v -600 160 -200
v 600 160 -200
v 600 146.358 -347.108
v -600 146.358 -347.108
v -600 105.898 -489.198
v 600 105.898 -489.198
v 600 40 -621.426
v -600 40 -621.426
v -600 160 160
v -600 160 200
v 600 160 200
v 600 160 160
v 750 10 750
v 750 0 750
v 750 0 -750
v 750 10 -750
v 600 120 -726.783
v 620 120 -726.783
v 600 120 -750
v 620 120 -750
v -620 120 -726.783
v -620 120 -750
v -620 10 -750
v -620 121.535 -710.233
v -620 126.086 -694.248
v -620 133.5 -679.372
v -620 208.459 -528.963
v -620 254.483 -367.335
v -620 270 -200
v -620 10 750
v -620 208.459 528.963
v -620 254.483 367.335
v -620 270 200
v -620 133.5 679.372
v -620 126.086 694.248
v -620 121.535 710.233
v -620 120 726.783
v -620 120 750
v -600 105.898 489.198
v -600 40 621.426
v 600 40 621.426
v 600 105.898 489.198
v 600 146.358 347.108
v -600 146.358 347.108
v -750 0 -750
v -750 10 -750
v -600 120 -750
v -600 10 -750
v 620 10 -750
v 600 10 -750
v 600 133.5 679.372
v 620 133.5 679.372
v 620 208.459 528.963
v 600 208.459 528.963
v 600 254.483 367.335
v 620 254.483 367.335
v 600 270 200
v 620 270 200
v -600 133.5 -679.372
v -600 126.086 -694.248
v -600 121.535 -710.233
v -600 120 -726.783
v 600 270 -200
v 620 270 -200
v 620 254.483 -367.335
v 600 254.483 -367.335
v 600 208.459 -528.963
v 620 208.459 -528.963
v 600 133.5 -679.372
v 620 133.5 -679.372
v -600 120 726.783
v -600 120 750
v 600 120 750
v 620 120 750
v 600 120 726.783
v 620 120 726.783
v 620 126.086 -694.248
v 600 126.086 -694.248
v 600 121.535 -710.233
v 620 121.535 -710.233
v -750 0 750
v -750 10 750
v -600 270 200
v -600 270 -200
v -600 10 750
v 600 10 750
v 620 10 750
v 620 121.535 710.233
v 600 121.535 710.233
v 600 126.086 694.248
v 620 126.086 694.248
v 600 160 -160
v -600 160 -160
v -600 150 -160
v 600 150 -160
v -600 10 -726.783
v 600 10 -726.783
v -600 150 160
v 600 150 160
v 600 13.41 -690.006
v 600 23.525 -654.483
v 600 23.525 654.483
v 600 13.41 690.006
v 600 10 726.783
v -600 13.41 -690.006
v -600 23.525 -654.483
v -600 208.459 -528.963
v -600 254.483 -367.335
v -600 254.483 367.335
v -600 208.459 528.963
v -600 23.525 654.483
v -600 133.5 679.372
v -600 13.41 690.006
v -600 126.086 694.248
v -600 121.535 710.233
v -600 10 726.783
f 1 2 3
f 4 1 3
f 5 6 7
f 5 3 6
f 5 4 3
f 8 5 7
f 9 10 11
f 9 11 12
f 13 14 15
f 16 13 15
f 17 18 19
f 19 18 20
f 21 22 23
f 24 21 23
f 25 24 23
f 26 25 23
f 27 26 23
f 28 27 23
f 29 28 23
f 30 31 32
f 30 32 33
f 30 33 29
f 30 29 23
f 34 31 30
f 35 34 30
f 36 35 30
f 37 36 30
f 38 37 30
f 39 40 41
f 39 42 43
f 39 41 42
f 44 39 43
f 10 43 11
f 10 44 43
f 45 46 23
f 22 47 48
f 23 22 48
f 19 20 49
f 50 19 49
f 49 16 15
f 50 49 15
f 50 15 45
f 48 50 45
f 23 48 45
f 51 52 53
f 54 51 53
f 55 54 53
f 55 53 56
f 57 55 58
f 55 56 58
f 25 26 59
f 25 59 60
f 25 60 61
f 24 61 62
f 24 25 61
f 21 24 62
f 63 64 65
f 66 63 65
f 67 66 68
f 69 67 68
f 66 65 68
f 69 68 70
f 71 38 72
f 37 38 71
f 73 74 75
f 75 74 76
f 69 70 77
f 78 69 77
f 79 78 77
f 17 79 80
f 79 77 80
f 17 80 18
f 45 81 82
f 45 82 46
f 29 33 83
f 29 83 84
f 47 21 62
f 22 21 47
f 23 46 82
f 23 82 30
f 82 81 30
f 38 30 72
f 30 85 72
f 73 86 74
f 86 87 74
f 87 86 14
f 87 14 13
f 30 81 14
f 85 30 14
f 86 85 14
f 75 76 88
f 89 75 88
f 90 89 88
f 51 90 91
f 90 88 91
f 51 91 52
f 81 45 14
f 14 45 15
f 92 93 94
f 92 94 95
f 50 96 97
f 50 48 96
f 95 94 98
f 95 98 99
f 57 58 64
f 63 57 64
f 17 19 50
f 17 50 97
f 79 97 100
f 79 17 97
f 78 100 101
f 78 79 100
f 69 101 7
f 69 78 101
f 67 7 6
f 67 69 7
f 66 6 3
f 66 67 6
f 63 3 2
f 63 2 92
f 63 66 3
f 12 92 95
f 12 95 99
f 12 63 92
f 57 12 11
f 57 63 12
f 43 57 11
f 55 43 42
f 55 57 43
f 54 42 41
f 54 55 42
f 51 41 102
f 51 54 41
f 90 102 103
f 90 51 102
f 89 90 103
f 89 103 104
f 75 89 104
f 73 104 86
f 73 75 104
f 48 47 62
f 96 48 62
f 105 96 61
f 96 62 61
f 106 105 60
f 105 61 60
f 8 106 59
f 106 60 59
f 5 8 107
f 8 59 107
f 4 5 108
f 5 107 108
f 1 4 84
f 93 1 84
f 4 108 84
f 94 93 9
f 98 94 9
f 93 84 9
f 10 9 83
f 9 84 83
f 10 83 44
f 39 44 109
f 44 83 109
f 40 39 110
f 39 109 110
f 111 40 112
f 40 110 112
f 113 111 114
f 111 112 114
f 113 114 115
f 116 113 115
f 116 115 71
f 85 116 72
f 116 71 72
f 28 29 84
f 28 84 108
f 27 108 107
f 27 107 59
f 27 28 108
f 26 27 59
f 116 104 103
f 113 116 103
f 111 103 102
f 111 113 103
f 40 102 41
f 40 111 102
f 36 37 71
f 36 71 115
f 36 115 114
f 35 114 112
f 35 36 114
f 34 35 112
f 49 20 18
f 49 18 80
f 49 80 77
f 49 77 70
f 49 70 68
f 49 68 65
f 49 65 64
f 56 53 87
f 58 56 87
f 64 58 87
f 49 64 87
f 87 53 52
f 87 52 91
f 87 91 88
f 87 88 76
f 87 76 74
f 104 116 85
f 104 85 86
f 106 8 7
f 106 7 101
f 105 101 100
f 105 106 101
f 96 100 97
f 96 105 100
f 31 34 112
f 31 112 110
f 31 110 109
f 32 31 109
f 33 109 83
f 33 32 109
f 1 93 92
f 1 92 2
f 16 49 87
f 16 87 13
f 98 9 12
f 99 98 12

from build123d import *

# Parameters (mm, degrees)
SKETCH2_W           = 1500
SKETCH2_H           = 1500
BOSS_EXTRUDE1_DEPTH = 10
BOSS_EXTRUDE3_DEPTH = 1240
BOSS_EXTRUDE4_DEPTH = 20
SKETCH6_W           = 1200
SKETCH6_H           = 320
CUT_EXTRUDE1_DEPTH  = 10


with BuildPart() as part:
    # Sketch2 → Boss-Extrude1 (new body)
    with BuildSketch(Plane(origin=(0, 0, 0), x_dir=(1, 0, 0), z_dir=(0, 1, 0))):
        Rectangle(SKETCH2_W, SKETCH2_H)
    extrude(amount=BOSS_EXTRUDE1_DEPTH)

    # Sketch4 → Boss-Extrude3 (add)
    with BuildSketch(Plane.ZY.offset(620)):
        with BuildLine():
            ThreePointArc((-621.426146358, 40.000002328), (-672.010429767, 17.646159988), (-726.782687643, 10))
            Line((-726.782687643, 10), (726.782687643, 10))
            ThreePointArc((726.782687643, 10), (672.010424989, 17.646161349), (621.426137912, 40.000007562))
            ThreePointArc((621.426137912, 40.000007562), (419.089016099, 129.415364432), (200, 160))
            Line((200, 160), (-200, 160))
            ThreePointArc((-200, 160), (-419.089020877, 129.415363072), (-621.426146358, 40.000002328))
        make_face()
    extrude(amount=-BOSS_EXTRUDE3_DEPTH)

    # Sketch5 → Boss-Extrude4 (add)
    with BuildSketch(Plane.ZY.offset(620)):
        with BuildLine():
            Line((-750, 120), (-750, 10))
            Line((-750, 10), (-726.782687643, 10))
            ThreePointArc((-726.782687643, 10), (-672.010429767, 17.646159988), (-621.426146358, 40.000002328))
            ThreePointArc((-621.426146358, 40.000002328), (-419.089020877, 129.415363072), (-200, 160))
            Line((-200, 160), (200, 160))
            ThreePointArc((200, 160), (419.089016099, 129.415364432), (621.426137912, 40.000007562))
            ThreePointArc((621.426137912, 40.000007562), (672.010424989, 17.646161349), (726.782687643, 10))
            Line((726.782687643, 10), (750, 10))
            Line((750, 10), (750, 120))
            Line((750, 120), (726.782687643, 120))
            ThreePointArc((726.782687643, 120), (702.135172555, 123.440771722), (679.372245755, 133.5))
            ThreePointArc((679.372245755, 133.5), (449.213763665, 235.209974806), (200, 270))
            Line((200, 270), (-200, 270))
            ThreePointArc((-200, 270), (-449.213763665, 235.209974806), (-679.372245755, 133.5))
            ThreePointArc((-679.372245755, 133.5), (-702.135172555, 123.440771722), (-726.782687643, 120))
            Line((-726.782687643, 120), (-750, 120))
        make_face()
    boss_extrude4 = extrude(amount=-BOSS_EXTRUDE4_DEPTH)

    # Mirror1: Boss-Extrude4 across plane
    add(boss_extrude4.mirror(Plane(origin=(0, 0, 0), x_dir=(0, 0, 1), z_dir=(1, 0, 0))))

    # Sketch6 → Cut-Extrude1 (cut)
    with BuildSketch(Plane(origin=(0, 160, 0), x_dir=(1, 0, 0), z_dir=(0, 1, 0))):
        Rectangle(SKETCH6_W, SKETCH6_H)
    extrude(amount=-CUT_EXTRUDE1_DEPTH, mode=Mode.SUBTRACT)


solid = part.part
